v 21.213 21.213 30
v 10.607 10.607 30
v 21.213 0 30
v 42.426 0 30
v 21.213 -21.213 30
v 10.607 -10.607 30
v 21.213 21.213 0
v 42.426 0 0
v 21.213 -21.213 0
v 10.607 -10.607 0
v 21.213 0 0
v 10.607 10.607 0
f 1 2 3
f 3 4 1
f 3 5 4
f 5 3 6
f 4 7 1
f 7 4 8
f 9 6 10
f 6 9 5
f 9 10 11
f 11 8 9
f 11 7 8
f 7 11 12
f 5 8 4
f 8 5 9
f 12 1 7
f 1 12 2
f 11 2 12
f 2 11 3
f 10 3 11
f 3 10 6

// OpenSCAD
rotate([0,0,-90])
rotate([0,-90,0]){
    difference(){
        rotate([-45,0,0]) {
            cube([30, 30, 30]);
        }
        scale([1,0.5,0.5]) {
            rotate([-45,0,0]) {
                cube([30, 30, 30]);
            }
        }
    }
}
